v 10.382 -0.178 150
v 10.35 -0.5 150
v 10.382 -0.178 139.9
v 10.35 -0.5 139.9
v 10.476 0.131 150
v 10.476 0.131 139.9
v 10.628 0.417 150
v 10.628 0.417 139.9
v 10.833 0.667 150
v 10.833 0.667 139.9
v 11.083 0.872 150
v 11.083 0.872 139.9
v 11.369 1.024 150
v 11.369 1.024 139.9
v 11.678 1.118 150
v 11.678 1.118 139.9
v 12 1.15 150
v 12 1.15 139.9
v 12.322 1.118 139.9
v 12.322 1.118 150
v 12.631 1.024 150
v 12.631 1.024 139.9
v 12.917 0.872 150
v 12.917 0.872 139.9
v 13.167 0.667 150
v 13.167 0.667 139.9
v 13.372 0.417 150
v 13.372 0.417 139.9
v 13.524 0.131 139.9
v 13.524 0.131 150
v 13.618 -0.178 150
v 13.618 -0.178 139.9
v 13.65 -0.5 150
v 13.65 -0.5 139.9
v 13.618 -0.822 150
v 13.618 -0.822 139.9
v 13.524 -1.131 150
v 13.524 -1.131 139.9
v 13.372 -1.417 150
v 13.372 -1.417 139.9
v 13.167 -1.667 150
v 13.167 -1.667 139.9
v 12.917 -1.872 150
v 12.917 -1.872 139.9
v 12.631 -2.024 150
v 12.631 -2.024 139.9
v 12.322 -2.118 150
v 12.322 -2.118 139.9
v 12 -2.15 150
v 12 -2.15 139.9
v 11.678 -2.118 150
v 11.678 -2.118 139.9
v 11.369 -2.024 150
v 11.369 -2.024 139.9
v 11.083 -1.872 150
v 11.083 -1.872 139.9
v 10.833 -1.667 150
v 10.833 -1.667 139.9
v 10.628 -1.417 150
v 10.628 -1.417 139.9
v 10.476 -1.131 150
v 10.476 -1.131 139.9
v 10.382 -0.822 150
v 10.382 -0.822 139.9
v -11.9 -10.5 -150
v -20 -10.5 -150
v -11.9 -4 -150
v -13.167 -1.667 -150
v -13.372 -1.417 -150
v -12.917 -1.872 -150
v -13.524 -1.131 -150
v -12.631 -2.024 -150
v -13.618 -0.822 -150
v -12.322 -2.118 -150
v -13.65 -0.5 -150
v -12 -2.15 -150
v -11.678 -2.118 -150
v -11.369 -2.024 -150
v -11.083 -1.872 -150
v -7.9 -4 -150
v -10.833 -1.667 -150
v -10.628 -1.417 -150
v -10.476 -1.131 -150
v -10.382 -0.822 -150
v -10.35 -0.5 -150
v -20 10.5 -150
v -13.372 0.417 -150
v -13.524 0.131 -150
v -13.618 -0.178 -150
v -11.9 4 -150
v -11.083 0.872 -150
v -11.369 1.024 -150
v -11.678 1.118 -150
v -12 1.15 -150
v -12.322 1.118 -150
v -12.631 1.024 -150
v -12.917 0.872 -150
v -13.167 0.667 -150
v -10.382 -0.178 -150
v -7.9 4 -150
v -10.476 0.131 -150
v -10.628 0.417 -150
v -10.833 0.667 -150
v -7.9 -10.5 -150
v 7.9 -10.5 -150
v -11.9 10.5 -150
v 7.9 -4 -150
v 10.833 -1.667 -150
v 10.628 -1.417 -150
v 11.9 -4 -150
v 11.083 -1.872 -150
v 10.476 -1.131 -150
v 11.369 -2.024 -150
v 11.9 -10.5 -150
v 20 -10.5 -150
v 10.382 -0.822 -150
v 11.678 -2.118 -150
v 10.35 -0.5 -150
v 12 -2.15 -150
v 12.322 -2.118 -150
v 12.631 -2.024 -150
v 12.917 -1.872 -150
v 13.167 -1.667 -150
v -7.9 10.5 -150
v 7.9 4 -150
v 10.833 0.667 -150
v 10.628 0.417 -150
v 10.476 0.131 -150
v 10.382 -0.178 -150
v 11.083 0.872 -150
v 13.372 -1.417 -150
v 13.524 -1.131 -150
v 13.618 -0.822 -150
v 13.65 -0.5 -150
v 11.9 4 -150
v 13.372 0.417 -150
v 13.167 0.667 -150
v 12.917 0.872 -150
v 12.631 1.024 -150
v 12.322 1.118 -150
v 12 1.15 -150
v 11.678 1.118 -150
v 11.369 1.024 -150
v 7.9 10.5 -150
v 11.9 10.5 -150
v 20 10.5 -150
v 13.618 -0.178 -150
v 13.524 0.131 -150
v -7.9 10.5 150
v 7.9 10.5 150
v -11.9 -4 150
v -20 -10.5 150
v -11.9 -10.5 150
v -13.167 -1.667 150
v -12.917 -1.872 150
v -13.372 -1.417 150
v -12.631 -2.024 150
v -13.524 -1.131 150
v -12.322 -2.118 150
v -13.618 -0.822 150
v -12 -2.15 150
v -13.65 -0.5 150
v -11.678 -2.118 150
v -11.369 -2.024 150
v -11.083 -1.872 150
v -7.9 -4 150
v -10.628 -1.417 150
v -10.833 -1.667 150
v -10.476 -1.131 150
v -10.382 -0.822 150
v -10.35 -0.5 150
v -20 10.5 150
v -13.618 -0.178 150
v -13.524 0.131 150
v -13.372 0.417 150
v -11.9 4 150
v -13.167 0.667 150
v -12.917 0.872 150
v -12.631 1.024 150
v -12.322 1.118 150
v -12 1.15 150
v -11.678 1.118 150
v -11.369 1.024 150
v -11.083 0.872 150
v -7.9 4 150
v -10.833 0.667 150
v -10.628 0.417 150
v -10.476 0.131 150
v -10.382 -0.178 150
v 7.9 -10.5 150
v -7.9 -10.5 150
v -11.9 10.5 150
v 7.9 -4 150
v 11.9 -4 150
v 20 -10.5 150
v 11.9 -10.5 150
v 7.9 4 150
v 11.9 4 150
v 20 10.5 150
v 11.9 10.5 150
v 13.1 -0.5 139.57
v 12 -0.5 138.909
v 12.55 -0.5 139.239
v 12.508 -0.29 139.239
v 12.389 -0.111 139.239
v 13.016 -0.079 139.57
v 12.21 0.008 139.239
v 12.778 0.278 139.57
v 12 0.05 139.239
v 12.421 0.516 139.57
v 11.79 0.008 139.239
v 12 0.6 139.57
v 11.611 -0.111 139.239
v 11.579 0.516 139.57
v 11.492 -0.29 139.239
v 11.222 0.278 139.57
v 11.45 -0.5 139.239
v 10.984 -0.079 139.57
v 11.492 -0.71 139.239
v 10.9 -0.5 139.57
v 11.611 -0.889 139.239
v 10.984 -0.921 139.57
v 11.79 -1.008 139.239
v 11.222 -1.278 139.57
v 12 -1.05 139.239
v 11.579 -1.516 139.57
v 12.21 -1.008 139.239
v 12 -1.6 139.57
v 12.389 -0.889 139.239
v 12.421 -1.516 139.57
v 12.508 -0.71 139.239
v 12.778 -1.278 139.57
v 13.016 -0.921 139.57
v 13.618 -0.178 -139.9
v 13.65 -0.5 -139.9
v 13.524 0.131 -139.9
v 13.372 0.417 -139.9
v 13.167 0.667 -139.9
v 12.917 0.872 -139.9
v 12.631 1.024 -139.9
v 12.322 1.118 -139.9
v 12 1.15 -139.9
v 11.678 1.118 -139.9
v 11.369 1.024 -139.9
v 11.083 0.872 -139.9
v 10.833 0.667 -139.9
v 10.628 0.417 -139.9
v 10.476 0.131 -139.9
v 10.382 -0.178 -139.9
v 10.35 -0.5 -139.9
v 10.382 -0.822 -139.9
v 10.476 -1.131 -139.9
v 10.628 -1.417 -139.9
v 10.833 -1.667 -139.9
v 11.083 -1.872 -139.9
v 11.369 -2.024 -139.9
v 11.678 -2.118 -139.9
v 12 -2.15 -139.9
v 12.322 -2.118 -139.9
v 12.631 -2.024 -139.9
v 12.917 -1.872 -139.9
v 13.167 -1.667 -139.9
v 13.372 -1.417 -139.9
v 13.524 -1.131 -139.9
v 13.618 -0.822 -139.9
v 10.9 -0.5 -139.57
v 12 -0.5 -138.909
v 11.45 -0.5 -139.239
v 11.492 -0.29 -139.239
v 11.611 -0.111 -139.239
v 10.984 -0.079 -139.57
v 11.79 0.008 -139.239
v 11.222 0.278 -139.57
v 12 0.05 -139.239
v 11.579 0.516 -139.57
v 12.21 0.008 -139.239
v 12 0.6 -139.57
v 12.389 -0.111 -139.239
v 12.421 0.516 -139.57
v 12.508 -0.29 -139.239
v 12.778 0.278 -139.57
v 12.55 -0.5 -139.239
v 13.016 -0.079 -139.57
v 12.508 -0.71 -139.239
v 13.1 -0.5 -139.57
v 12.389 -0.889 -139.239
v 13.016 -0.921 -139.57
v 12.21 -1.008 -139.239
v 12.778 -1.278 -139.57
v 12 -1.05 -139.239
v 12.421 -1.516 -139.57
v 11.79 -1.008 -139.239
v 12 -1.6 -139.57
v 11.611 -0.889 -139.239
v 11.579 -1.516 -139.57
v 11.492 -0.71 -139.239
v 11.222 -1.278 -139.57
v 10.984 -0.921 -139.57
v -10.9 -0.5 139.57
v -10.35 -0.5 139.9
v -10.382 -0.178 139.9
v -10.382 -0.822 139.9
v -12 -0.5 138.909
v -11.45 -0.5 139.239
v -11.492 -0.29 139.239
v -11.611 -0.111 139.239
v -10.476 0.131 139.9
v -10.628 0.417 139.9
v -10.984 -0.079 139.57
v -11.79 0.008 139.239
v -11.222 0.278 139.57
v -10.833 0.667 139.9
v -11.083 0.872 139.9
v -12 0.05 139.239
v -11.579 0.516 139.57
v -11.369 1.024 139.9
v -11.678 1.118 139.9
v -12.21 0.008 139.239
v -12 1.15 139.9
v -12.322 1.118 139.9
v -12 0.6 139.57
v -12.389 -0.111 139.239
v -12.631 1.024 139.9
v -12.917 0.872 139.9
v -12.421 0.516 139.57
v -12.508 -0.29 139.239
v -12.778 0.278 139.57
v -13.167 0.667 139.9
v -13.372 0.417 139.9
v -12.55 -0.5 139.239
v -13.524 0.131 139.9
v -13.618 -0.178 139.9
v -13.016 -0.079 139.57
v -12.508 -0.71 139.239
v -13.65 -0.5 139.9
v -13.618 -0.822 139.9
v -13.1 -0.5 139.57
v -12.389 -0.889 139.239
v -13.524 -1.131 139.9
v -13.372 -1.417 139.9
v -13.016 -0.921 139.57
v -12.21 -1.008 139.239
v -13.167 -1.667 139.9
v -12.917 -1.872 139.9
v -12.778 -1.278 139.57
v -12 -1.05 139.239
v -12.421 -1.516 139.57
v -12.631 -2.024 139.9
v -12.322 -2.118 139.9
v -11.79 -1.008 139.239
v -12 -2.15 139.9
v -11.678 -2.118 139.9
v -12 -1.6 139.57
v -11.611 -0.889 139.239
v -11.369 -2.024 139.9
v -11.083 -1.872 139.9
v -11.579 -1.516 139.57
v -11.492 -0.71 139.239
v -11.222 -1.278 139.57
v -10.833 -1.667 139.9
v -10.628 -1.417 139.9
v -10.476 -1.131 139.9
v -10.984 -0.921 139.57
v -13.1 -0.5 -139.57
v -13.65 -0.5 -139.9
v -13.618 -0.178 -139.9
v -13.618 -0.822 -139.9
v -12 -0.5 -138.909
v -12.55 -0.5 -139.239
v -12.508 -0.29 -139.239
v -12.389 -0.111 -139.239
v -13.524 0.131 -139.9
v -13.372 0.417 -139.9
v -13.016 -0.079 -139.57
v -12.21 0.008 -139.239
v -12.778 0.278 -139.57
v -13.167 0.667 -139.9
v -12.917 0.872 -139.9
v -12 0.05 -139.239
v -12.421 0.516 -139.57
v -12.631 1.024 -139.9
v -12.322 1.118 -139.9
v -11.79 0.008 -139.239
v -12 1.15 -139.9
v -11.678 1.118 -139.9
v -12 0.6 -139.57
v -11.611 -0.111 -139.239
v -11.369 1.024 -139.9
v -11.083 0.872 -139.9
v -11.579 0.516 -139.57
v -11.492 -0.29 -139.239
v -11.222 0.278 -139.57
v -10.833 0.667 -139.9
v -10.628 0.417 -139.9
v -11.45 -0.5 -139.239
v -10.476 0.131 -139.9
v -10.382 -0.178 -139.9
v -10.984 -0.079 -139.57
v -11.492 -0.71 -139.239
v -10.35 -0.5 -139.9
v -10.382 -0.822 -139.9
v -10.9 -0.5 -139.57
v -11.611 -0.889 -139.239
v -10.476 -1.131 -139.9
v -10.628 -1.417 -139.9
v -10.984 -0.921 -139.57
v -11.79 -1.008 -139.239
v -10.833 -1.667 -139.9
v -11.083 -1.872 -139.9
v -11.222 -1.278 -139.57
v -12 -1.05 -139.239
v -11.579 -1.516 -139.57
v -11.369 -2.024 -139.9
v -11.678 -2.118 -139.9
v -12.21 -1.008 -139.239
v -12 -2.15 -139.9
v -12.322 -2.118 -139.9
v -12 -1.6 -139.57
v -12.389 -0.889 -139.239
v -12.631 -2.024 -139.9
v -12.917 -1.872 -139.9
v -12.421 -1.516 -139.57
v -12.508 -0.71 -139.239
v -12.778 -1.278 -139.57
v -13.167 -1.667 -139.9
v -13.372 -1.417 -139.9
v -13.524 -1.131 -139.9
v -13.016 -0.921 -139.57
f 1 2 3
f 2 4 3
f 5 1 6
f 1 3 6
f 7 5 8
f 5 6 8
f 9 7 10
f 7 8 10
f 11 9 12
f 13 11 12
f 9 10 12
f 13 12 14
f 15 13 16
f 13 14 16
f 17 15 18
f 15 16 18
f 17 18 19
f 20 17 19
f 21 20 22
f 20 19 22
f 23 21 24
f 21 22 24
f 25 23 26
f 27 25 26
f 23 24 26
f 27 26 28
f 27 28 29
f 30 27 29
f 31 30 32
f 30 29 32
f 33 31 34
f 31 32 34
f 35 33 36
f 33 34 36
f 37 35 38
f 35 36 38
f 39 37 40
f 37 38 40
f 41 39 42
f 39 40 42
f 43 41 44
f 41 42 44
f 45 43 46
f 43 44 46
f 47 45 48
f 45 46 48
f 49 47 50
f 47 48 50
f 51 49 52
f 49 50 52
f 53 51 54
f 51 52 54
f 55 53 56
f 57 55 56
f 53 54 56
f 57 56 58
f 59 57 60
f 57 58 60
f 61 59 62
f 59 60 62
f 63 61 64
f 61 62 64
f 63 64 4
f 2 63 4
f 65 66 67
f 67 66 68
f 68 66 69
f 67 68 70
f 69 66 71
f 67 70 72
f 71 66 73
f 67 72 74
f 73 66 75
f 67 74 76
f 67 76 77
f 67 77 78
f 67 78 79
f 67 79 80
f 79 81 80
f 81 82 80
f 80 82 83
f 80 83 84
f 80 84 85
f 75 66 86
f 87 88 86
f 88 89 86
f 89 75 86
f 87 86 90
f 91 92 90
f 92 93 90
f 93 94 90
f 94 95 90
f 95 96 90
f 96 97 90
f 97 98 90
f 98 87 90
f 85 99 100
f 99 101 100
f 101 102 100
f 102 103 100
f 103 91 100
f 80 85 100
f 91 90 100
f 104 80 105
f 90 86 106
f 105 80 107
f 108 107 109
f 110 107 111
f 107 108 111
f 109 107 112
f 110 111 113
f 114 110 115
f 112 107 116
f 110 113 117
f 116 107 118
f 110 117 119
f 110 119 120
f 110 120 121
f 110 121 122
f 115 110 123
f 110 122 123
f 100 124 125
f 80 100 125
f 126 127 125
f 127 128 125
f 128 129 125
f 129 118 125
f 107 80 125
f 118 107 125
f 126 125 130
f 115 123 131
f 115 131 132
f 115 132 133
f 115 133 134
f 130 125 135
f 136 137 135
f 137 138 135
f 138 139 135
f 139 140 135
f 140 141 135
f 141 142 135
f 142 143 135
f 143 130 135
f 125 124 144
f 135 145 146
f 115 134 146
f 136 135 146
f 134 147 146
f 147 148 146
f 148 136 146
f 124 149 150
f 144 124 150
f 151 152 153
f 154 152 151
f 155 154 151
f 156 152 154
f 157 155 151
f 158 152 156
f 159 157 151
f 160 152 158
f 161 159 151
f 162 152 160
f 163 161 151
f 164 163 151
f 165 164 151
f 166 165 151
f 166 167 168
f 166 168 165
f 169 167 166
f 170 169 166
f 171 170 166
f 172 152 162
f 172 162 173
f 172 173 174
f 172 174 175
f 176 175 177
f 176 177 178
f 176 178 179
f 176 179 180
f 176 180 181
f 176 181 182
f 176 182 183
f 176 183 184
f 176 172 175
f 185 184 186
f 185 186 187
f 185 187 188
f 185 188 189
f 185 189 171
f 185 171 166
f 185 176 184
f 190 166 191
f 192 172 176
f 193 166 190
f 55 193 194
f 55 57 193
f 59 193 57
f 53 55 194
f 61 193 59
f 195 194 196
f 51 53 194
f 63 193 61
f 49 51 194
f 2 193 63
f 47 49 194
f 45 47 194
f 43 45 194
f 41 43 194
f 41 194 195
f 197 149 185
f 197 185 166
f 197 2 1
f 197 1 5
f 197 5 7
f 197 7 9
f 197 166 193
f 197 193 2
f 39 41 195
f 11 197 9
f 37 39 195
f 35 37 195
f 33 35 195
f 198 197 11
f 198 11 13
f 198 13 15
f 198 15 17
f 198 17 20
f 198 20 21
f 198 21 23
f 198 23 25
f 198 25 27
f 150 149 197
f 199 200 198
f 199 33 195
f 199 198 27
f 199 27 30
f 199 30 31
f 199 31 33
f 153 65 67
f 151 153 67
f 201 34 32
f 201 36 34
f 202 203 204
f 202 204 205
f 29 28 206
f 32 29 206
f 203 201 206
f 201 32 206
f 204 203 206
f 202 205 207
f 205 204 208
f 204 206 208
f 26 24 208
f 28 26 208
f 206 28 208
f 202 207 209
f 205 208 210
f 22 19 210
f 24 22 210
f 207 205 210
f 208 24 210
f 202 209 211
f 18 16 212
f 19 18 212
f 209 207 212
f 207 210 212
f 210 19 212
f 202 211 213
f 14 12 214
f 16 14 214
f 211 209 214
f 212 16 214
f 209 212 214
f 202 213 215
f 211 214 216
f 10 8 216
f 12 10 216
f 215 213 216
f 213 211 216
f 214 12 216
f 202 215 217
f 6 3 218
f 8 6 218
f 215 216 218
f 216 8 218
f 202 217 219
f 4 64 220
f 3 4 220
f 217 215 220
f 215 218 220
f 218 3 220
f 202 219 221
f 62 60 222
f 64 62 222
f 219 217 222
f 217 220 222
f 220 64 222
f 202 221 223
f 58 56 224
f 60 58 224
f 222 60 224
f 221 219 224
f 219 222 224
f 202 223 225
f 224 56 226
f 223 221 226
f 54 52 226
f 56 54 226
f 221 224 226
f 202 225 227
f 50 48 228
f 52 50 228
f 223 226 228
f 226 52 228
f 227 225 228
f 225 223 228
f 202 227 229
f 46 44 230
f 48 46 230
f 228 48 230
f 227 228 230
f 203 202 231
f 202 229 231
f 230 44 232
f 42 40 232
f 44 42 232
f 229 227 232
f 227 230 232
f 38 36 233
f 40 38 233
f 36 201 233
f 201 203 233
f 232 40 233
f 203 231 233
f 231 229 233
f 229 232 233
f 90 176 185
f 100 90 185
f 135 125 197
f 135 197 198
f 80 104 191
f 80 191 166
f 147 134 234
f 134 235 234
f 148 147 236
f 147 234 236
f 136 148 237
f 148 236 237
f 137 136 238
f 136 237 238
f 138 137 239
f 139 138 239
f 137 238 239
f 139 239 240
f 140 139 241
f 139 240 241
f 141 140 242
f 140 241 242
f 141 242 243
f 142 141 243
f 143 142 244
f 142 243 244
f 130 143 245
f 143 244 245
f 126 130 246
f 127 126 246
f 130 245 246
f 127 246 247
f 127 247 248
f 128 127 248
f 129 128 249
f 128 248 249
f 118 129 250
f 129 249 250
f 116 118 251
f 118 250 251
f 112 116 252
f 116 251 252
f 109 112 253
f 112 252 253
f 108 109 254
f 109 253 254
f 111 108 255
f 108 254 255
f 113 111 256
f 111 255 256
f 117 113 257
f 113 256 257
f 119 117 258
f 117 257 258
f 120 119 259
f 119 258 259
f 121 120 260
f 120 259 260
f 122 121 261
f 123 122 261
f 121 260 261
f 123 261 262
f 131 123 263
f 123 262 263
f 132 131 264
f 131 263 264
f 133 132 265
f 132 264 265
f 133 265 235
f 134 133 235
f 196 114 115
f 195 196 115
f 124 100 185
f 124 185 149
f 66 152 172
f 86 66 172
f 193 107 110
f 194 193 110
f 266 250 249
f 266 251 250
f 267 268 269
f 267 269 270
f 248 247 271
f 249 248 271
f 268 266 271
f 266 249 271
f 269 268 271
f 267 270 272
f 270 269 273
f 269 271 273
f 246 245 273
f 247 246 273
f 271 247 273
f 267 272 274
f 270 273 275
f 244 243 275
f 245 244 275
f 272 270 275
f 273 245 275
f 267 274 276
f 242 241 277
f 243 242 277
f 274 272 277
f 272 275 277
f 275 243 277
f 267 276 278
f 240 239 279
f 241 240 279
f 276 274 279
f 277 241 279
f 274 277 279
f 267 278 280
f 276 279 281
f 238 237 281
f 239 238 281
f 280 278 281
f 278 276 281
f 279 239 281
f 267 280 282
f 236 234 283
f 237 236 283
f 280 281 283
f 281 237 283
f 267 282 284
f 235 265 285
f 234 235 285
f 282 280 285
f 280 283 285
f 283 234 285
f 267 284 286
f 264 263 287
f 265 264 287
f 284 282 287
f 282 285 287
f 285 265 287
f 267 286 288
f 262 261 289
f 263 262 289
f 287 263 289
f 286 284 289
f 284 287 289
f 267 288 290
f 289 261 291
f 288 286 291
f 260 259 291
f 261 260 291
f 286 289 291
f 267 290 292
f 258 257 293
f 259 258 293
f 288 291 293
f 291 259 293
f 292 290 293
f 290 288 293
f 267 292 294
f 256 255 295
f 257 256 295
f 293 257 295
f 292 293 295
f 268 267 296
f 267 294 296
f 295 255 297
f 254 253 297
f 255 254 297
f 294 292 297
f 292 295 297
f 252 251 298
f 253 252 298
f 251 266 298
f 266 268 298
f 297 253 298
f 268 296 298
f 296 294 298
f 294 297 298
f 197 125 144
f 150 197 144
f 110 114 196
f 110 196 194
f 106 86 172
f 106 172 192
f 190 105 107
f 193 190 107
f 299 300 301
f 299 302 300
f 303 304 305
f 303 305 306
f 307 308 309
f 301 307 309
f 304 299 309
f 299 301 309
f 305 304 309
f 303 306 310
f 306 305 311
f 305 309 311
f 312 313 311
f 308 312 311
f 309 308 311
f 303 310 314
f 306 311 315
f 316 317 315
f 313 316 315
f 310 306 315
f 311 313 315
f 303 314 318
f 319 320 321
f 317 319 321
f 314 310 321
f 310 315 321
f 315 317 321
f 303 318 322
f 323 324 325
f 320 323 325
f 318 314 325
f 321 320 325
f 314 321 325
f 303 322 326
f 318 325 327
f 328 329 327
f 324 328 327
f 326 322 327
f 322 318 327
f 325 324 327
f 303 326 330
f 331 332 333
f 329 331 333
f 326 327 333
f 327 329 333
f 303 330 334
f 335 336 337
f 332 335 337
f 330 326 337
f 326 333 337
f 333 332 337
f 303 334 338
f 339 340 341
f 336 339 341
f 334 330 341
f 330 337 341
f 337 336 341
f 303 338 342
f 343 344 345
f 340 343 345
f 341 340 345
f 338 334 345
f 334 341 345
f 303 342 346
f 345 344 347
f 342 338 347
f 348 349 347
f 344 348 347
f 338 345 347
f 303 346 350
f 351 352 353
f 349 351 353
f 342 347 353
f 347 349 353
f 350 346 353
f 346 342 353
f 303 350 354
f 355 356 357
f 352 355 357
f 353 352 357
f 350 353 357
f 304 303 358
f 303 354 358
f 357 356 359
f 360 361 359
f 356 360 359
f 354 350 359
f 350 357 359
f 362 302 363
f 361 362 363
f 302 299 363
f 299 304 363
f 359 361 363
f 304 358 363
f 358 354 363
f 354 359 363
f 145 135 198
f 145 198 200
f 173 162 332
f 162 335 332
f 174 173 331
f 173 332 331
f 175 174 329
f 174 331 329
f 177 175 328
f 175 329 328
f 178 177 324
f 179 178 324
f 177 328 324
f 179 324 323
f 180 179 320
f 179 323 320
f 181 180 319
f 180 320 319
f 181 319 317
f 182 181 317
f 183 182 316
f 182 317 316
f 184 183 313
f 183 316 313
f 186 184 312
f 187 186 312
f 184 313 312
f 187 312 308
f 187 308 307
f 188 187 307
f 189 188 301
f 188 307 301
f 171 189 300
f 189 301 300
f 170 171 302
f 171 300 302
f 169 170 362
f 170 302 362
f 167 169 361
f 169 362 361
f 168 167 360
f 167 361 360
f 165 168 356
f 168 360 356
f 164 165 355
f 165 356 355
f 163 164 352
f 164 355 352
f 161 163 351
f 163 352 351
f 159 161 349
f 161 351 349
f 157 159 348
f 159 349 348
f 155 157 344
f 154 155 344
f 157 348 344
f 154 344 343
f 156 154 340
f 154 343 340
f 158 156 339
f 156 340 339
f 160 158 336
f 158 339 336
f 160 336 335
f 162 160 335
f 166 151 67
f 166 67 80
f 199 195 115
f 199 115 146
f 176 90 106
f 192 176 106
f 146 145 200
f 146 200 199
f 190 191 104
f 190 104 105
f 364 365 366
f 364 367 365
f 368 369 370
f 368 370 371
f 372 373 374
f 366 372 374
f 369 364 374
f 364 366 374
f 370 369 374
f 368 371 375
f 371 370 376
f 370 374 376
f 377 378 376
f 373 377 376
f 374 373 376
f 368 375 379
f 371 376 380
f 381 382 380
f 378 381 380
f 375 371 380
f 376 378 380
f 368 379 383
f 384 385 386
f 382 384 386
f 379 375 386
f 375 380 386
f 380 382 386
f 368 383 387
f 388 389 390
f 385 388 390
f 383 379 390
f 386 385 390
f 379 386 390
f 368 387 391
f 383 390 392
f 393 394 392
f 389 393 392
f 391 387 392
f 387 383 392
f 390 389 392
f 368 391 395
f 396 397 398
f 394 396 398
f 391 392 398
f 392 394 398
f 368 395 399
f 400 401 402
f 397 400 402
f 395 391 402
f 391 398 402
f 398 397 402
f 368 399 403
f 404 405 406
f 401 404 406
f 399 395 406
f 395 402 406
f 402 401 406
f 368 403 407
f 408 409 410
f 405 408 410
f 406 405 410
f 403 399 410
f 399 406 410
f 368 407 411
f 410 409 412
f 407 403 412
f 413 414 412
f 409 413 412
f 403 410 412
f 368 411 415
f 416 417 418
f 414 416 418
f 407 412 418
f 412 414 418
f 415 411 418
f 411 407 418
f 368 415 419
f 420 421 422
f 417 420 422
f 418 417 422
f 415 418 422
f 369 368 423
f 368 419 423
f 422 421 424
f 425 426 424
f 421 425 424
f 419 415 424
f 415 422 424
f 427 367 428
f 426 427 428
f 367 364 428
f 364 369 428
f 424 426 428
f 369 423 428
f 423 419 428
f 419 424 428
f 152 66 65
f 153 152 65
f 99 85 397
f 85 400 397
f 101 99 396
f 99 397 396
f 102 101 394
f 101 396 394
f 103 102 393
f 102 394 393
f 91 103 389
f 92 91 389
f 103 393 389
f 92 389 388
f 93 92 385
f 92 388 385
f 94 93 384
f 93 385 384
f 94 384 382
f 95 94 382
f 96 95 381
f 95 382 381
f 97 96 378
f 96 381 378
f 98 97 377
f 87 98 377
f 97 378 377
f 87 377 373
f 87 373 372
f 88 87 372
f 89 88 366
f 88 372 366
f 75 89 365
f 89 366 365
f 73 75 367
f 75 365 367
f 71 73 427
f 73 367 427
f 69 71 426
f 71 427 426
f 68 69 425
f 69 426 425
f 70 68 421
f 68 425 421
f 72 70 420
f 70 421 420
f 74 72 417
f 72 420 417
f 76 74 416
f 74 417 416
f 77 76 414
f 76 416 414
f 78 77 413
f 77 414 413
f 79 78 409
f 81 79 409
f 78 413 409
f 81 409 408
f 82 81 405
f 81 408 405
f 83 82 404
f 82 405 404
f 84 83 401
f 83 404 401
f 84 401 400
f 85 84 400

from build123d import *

# Parameters (mm, degrees)
SKETCH1_W                 = 40
SKETCH1_H                 = 21
BOSS_EXTRUDE1_DEPTH       = 150
CUT_EXTRUDE1_DEPTH        = 152.691298366
CUT_EXTRUDE1_DEPTH_BACK   = 152.691298366
SKETCH2_W                 = 4
SKETCH2_H                 = 6.5
M4X0_7_TAPPED_HOLE1_D     = 3.3
M4X0_7_TAPPED_HOLE1_DEPTH = 10.1
M4X0_7_TAPPED_HOLE1_TIP   = 0.991420021
M4X0_7_TAPPED_HOLE2_D     = 3.3
M4X0_7_TAPPED_HOLE2_DEPTH = 10.1
M4X0_7_TAPPED_HOLE2_TIP   = 0.991420021


with BuildPart() as part:
    # Sketch1 → Boss-Extrude1 (new, symmetric)
    with BuildSketch(Plane.XY):
        Rectangle(SKETCH1_W, SKETCH1_H)
    extrude(amount=BOSS_EXTRUDE1_DEPTH, both=True)

    # Sketch2 → Cut-Extrude1 (cut, two sides: drawn at the far end of the back side and taken through both)
    with BuildSketch(Plane.XY.offset(-CUT_EXTRUDE1_DEPTH_BACK)):
        with Locations((9.9, 7.25)):
            Rectangle(SKETCH2_W, SKETCH2_H)
        with Locations((-9.9, 7.25)):
            Rectangle(SKETCH2_W, SKETCH2_H)
        with Locations((9.9, -7.25)):
            Rectangle(SKETCH2_W, SKETCH2_H)
        with Locations((-9.9, -7.25)):
            Rectangle(SKETCH2_W, SKETCH2_H)
    extrude(amount=CUT_EXTRUDE1_DEPTH + CUT_EXTRUDE1_DEPTH_BACK, mode=Mode.SUBTRACT)

    # M4x0.7 Tapped Hole1
    with Locations(Plane.XY.offset(150)):
        with Locations((-12, -0.5), (12, -0.5)):
            Hole(M4X0_7_TAPPED_HOLE1_D / 2, depth=M4X0_7_TAPPED_HOLE1_DEPTH)
            with Locations((0, 0, -(M4X0_7_TAPPED_HOLE1_DEPTH + M4X0_7_TAPPED_HOLE1_TIP / 2))):  # 118° drill point
                Cone(0, M4X0_7_TAPPED_HOLE1_D / 2, M4X0_7_TAPPED_HOLE1_TIP, mode=Mode.SUBTRACT)

    # M4x0.7 Tapped Hole2
    with Locations(Plane(origin=(0, 0, -150), x_dir=(-1, 0, 0), z_dir=(0, 0, -1))):
        with Locations((-12, -0.5), (12, -0.5)):
            Hole(M4X0_7_TAPPED_HOLE2_D / 2, depth=M4X0_7_TAPPED_HOLE2_DEPTH)
            with Locations((0, 0, -(M4X0_7_TAPPED_HOLE2_DEPTH + M4X0_7_TAPPED_HOLE2_TIP / 2))):  # 118° drill point
                Cone(0, M4X0_7_TAPPED_HOLE2_D / 2, M4X0_7_TAPPED_HOLE2_TIP, mode=Mode.SUBTRACT)


solid = part.part
